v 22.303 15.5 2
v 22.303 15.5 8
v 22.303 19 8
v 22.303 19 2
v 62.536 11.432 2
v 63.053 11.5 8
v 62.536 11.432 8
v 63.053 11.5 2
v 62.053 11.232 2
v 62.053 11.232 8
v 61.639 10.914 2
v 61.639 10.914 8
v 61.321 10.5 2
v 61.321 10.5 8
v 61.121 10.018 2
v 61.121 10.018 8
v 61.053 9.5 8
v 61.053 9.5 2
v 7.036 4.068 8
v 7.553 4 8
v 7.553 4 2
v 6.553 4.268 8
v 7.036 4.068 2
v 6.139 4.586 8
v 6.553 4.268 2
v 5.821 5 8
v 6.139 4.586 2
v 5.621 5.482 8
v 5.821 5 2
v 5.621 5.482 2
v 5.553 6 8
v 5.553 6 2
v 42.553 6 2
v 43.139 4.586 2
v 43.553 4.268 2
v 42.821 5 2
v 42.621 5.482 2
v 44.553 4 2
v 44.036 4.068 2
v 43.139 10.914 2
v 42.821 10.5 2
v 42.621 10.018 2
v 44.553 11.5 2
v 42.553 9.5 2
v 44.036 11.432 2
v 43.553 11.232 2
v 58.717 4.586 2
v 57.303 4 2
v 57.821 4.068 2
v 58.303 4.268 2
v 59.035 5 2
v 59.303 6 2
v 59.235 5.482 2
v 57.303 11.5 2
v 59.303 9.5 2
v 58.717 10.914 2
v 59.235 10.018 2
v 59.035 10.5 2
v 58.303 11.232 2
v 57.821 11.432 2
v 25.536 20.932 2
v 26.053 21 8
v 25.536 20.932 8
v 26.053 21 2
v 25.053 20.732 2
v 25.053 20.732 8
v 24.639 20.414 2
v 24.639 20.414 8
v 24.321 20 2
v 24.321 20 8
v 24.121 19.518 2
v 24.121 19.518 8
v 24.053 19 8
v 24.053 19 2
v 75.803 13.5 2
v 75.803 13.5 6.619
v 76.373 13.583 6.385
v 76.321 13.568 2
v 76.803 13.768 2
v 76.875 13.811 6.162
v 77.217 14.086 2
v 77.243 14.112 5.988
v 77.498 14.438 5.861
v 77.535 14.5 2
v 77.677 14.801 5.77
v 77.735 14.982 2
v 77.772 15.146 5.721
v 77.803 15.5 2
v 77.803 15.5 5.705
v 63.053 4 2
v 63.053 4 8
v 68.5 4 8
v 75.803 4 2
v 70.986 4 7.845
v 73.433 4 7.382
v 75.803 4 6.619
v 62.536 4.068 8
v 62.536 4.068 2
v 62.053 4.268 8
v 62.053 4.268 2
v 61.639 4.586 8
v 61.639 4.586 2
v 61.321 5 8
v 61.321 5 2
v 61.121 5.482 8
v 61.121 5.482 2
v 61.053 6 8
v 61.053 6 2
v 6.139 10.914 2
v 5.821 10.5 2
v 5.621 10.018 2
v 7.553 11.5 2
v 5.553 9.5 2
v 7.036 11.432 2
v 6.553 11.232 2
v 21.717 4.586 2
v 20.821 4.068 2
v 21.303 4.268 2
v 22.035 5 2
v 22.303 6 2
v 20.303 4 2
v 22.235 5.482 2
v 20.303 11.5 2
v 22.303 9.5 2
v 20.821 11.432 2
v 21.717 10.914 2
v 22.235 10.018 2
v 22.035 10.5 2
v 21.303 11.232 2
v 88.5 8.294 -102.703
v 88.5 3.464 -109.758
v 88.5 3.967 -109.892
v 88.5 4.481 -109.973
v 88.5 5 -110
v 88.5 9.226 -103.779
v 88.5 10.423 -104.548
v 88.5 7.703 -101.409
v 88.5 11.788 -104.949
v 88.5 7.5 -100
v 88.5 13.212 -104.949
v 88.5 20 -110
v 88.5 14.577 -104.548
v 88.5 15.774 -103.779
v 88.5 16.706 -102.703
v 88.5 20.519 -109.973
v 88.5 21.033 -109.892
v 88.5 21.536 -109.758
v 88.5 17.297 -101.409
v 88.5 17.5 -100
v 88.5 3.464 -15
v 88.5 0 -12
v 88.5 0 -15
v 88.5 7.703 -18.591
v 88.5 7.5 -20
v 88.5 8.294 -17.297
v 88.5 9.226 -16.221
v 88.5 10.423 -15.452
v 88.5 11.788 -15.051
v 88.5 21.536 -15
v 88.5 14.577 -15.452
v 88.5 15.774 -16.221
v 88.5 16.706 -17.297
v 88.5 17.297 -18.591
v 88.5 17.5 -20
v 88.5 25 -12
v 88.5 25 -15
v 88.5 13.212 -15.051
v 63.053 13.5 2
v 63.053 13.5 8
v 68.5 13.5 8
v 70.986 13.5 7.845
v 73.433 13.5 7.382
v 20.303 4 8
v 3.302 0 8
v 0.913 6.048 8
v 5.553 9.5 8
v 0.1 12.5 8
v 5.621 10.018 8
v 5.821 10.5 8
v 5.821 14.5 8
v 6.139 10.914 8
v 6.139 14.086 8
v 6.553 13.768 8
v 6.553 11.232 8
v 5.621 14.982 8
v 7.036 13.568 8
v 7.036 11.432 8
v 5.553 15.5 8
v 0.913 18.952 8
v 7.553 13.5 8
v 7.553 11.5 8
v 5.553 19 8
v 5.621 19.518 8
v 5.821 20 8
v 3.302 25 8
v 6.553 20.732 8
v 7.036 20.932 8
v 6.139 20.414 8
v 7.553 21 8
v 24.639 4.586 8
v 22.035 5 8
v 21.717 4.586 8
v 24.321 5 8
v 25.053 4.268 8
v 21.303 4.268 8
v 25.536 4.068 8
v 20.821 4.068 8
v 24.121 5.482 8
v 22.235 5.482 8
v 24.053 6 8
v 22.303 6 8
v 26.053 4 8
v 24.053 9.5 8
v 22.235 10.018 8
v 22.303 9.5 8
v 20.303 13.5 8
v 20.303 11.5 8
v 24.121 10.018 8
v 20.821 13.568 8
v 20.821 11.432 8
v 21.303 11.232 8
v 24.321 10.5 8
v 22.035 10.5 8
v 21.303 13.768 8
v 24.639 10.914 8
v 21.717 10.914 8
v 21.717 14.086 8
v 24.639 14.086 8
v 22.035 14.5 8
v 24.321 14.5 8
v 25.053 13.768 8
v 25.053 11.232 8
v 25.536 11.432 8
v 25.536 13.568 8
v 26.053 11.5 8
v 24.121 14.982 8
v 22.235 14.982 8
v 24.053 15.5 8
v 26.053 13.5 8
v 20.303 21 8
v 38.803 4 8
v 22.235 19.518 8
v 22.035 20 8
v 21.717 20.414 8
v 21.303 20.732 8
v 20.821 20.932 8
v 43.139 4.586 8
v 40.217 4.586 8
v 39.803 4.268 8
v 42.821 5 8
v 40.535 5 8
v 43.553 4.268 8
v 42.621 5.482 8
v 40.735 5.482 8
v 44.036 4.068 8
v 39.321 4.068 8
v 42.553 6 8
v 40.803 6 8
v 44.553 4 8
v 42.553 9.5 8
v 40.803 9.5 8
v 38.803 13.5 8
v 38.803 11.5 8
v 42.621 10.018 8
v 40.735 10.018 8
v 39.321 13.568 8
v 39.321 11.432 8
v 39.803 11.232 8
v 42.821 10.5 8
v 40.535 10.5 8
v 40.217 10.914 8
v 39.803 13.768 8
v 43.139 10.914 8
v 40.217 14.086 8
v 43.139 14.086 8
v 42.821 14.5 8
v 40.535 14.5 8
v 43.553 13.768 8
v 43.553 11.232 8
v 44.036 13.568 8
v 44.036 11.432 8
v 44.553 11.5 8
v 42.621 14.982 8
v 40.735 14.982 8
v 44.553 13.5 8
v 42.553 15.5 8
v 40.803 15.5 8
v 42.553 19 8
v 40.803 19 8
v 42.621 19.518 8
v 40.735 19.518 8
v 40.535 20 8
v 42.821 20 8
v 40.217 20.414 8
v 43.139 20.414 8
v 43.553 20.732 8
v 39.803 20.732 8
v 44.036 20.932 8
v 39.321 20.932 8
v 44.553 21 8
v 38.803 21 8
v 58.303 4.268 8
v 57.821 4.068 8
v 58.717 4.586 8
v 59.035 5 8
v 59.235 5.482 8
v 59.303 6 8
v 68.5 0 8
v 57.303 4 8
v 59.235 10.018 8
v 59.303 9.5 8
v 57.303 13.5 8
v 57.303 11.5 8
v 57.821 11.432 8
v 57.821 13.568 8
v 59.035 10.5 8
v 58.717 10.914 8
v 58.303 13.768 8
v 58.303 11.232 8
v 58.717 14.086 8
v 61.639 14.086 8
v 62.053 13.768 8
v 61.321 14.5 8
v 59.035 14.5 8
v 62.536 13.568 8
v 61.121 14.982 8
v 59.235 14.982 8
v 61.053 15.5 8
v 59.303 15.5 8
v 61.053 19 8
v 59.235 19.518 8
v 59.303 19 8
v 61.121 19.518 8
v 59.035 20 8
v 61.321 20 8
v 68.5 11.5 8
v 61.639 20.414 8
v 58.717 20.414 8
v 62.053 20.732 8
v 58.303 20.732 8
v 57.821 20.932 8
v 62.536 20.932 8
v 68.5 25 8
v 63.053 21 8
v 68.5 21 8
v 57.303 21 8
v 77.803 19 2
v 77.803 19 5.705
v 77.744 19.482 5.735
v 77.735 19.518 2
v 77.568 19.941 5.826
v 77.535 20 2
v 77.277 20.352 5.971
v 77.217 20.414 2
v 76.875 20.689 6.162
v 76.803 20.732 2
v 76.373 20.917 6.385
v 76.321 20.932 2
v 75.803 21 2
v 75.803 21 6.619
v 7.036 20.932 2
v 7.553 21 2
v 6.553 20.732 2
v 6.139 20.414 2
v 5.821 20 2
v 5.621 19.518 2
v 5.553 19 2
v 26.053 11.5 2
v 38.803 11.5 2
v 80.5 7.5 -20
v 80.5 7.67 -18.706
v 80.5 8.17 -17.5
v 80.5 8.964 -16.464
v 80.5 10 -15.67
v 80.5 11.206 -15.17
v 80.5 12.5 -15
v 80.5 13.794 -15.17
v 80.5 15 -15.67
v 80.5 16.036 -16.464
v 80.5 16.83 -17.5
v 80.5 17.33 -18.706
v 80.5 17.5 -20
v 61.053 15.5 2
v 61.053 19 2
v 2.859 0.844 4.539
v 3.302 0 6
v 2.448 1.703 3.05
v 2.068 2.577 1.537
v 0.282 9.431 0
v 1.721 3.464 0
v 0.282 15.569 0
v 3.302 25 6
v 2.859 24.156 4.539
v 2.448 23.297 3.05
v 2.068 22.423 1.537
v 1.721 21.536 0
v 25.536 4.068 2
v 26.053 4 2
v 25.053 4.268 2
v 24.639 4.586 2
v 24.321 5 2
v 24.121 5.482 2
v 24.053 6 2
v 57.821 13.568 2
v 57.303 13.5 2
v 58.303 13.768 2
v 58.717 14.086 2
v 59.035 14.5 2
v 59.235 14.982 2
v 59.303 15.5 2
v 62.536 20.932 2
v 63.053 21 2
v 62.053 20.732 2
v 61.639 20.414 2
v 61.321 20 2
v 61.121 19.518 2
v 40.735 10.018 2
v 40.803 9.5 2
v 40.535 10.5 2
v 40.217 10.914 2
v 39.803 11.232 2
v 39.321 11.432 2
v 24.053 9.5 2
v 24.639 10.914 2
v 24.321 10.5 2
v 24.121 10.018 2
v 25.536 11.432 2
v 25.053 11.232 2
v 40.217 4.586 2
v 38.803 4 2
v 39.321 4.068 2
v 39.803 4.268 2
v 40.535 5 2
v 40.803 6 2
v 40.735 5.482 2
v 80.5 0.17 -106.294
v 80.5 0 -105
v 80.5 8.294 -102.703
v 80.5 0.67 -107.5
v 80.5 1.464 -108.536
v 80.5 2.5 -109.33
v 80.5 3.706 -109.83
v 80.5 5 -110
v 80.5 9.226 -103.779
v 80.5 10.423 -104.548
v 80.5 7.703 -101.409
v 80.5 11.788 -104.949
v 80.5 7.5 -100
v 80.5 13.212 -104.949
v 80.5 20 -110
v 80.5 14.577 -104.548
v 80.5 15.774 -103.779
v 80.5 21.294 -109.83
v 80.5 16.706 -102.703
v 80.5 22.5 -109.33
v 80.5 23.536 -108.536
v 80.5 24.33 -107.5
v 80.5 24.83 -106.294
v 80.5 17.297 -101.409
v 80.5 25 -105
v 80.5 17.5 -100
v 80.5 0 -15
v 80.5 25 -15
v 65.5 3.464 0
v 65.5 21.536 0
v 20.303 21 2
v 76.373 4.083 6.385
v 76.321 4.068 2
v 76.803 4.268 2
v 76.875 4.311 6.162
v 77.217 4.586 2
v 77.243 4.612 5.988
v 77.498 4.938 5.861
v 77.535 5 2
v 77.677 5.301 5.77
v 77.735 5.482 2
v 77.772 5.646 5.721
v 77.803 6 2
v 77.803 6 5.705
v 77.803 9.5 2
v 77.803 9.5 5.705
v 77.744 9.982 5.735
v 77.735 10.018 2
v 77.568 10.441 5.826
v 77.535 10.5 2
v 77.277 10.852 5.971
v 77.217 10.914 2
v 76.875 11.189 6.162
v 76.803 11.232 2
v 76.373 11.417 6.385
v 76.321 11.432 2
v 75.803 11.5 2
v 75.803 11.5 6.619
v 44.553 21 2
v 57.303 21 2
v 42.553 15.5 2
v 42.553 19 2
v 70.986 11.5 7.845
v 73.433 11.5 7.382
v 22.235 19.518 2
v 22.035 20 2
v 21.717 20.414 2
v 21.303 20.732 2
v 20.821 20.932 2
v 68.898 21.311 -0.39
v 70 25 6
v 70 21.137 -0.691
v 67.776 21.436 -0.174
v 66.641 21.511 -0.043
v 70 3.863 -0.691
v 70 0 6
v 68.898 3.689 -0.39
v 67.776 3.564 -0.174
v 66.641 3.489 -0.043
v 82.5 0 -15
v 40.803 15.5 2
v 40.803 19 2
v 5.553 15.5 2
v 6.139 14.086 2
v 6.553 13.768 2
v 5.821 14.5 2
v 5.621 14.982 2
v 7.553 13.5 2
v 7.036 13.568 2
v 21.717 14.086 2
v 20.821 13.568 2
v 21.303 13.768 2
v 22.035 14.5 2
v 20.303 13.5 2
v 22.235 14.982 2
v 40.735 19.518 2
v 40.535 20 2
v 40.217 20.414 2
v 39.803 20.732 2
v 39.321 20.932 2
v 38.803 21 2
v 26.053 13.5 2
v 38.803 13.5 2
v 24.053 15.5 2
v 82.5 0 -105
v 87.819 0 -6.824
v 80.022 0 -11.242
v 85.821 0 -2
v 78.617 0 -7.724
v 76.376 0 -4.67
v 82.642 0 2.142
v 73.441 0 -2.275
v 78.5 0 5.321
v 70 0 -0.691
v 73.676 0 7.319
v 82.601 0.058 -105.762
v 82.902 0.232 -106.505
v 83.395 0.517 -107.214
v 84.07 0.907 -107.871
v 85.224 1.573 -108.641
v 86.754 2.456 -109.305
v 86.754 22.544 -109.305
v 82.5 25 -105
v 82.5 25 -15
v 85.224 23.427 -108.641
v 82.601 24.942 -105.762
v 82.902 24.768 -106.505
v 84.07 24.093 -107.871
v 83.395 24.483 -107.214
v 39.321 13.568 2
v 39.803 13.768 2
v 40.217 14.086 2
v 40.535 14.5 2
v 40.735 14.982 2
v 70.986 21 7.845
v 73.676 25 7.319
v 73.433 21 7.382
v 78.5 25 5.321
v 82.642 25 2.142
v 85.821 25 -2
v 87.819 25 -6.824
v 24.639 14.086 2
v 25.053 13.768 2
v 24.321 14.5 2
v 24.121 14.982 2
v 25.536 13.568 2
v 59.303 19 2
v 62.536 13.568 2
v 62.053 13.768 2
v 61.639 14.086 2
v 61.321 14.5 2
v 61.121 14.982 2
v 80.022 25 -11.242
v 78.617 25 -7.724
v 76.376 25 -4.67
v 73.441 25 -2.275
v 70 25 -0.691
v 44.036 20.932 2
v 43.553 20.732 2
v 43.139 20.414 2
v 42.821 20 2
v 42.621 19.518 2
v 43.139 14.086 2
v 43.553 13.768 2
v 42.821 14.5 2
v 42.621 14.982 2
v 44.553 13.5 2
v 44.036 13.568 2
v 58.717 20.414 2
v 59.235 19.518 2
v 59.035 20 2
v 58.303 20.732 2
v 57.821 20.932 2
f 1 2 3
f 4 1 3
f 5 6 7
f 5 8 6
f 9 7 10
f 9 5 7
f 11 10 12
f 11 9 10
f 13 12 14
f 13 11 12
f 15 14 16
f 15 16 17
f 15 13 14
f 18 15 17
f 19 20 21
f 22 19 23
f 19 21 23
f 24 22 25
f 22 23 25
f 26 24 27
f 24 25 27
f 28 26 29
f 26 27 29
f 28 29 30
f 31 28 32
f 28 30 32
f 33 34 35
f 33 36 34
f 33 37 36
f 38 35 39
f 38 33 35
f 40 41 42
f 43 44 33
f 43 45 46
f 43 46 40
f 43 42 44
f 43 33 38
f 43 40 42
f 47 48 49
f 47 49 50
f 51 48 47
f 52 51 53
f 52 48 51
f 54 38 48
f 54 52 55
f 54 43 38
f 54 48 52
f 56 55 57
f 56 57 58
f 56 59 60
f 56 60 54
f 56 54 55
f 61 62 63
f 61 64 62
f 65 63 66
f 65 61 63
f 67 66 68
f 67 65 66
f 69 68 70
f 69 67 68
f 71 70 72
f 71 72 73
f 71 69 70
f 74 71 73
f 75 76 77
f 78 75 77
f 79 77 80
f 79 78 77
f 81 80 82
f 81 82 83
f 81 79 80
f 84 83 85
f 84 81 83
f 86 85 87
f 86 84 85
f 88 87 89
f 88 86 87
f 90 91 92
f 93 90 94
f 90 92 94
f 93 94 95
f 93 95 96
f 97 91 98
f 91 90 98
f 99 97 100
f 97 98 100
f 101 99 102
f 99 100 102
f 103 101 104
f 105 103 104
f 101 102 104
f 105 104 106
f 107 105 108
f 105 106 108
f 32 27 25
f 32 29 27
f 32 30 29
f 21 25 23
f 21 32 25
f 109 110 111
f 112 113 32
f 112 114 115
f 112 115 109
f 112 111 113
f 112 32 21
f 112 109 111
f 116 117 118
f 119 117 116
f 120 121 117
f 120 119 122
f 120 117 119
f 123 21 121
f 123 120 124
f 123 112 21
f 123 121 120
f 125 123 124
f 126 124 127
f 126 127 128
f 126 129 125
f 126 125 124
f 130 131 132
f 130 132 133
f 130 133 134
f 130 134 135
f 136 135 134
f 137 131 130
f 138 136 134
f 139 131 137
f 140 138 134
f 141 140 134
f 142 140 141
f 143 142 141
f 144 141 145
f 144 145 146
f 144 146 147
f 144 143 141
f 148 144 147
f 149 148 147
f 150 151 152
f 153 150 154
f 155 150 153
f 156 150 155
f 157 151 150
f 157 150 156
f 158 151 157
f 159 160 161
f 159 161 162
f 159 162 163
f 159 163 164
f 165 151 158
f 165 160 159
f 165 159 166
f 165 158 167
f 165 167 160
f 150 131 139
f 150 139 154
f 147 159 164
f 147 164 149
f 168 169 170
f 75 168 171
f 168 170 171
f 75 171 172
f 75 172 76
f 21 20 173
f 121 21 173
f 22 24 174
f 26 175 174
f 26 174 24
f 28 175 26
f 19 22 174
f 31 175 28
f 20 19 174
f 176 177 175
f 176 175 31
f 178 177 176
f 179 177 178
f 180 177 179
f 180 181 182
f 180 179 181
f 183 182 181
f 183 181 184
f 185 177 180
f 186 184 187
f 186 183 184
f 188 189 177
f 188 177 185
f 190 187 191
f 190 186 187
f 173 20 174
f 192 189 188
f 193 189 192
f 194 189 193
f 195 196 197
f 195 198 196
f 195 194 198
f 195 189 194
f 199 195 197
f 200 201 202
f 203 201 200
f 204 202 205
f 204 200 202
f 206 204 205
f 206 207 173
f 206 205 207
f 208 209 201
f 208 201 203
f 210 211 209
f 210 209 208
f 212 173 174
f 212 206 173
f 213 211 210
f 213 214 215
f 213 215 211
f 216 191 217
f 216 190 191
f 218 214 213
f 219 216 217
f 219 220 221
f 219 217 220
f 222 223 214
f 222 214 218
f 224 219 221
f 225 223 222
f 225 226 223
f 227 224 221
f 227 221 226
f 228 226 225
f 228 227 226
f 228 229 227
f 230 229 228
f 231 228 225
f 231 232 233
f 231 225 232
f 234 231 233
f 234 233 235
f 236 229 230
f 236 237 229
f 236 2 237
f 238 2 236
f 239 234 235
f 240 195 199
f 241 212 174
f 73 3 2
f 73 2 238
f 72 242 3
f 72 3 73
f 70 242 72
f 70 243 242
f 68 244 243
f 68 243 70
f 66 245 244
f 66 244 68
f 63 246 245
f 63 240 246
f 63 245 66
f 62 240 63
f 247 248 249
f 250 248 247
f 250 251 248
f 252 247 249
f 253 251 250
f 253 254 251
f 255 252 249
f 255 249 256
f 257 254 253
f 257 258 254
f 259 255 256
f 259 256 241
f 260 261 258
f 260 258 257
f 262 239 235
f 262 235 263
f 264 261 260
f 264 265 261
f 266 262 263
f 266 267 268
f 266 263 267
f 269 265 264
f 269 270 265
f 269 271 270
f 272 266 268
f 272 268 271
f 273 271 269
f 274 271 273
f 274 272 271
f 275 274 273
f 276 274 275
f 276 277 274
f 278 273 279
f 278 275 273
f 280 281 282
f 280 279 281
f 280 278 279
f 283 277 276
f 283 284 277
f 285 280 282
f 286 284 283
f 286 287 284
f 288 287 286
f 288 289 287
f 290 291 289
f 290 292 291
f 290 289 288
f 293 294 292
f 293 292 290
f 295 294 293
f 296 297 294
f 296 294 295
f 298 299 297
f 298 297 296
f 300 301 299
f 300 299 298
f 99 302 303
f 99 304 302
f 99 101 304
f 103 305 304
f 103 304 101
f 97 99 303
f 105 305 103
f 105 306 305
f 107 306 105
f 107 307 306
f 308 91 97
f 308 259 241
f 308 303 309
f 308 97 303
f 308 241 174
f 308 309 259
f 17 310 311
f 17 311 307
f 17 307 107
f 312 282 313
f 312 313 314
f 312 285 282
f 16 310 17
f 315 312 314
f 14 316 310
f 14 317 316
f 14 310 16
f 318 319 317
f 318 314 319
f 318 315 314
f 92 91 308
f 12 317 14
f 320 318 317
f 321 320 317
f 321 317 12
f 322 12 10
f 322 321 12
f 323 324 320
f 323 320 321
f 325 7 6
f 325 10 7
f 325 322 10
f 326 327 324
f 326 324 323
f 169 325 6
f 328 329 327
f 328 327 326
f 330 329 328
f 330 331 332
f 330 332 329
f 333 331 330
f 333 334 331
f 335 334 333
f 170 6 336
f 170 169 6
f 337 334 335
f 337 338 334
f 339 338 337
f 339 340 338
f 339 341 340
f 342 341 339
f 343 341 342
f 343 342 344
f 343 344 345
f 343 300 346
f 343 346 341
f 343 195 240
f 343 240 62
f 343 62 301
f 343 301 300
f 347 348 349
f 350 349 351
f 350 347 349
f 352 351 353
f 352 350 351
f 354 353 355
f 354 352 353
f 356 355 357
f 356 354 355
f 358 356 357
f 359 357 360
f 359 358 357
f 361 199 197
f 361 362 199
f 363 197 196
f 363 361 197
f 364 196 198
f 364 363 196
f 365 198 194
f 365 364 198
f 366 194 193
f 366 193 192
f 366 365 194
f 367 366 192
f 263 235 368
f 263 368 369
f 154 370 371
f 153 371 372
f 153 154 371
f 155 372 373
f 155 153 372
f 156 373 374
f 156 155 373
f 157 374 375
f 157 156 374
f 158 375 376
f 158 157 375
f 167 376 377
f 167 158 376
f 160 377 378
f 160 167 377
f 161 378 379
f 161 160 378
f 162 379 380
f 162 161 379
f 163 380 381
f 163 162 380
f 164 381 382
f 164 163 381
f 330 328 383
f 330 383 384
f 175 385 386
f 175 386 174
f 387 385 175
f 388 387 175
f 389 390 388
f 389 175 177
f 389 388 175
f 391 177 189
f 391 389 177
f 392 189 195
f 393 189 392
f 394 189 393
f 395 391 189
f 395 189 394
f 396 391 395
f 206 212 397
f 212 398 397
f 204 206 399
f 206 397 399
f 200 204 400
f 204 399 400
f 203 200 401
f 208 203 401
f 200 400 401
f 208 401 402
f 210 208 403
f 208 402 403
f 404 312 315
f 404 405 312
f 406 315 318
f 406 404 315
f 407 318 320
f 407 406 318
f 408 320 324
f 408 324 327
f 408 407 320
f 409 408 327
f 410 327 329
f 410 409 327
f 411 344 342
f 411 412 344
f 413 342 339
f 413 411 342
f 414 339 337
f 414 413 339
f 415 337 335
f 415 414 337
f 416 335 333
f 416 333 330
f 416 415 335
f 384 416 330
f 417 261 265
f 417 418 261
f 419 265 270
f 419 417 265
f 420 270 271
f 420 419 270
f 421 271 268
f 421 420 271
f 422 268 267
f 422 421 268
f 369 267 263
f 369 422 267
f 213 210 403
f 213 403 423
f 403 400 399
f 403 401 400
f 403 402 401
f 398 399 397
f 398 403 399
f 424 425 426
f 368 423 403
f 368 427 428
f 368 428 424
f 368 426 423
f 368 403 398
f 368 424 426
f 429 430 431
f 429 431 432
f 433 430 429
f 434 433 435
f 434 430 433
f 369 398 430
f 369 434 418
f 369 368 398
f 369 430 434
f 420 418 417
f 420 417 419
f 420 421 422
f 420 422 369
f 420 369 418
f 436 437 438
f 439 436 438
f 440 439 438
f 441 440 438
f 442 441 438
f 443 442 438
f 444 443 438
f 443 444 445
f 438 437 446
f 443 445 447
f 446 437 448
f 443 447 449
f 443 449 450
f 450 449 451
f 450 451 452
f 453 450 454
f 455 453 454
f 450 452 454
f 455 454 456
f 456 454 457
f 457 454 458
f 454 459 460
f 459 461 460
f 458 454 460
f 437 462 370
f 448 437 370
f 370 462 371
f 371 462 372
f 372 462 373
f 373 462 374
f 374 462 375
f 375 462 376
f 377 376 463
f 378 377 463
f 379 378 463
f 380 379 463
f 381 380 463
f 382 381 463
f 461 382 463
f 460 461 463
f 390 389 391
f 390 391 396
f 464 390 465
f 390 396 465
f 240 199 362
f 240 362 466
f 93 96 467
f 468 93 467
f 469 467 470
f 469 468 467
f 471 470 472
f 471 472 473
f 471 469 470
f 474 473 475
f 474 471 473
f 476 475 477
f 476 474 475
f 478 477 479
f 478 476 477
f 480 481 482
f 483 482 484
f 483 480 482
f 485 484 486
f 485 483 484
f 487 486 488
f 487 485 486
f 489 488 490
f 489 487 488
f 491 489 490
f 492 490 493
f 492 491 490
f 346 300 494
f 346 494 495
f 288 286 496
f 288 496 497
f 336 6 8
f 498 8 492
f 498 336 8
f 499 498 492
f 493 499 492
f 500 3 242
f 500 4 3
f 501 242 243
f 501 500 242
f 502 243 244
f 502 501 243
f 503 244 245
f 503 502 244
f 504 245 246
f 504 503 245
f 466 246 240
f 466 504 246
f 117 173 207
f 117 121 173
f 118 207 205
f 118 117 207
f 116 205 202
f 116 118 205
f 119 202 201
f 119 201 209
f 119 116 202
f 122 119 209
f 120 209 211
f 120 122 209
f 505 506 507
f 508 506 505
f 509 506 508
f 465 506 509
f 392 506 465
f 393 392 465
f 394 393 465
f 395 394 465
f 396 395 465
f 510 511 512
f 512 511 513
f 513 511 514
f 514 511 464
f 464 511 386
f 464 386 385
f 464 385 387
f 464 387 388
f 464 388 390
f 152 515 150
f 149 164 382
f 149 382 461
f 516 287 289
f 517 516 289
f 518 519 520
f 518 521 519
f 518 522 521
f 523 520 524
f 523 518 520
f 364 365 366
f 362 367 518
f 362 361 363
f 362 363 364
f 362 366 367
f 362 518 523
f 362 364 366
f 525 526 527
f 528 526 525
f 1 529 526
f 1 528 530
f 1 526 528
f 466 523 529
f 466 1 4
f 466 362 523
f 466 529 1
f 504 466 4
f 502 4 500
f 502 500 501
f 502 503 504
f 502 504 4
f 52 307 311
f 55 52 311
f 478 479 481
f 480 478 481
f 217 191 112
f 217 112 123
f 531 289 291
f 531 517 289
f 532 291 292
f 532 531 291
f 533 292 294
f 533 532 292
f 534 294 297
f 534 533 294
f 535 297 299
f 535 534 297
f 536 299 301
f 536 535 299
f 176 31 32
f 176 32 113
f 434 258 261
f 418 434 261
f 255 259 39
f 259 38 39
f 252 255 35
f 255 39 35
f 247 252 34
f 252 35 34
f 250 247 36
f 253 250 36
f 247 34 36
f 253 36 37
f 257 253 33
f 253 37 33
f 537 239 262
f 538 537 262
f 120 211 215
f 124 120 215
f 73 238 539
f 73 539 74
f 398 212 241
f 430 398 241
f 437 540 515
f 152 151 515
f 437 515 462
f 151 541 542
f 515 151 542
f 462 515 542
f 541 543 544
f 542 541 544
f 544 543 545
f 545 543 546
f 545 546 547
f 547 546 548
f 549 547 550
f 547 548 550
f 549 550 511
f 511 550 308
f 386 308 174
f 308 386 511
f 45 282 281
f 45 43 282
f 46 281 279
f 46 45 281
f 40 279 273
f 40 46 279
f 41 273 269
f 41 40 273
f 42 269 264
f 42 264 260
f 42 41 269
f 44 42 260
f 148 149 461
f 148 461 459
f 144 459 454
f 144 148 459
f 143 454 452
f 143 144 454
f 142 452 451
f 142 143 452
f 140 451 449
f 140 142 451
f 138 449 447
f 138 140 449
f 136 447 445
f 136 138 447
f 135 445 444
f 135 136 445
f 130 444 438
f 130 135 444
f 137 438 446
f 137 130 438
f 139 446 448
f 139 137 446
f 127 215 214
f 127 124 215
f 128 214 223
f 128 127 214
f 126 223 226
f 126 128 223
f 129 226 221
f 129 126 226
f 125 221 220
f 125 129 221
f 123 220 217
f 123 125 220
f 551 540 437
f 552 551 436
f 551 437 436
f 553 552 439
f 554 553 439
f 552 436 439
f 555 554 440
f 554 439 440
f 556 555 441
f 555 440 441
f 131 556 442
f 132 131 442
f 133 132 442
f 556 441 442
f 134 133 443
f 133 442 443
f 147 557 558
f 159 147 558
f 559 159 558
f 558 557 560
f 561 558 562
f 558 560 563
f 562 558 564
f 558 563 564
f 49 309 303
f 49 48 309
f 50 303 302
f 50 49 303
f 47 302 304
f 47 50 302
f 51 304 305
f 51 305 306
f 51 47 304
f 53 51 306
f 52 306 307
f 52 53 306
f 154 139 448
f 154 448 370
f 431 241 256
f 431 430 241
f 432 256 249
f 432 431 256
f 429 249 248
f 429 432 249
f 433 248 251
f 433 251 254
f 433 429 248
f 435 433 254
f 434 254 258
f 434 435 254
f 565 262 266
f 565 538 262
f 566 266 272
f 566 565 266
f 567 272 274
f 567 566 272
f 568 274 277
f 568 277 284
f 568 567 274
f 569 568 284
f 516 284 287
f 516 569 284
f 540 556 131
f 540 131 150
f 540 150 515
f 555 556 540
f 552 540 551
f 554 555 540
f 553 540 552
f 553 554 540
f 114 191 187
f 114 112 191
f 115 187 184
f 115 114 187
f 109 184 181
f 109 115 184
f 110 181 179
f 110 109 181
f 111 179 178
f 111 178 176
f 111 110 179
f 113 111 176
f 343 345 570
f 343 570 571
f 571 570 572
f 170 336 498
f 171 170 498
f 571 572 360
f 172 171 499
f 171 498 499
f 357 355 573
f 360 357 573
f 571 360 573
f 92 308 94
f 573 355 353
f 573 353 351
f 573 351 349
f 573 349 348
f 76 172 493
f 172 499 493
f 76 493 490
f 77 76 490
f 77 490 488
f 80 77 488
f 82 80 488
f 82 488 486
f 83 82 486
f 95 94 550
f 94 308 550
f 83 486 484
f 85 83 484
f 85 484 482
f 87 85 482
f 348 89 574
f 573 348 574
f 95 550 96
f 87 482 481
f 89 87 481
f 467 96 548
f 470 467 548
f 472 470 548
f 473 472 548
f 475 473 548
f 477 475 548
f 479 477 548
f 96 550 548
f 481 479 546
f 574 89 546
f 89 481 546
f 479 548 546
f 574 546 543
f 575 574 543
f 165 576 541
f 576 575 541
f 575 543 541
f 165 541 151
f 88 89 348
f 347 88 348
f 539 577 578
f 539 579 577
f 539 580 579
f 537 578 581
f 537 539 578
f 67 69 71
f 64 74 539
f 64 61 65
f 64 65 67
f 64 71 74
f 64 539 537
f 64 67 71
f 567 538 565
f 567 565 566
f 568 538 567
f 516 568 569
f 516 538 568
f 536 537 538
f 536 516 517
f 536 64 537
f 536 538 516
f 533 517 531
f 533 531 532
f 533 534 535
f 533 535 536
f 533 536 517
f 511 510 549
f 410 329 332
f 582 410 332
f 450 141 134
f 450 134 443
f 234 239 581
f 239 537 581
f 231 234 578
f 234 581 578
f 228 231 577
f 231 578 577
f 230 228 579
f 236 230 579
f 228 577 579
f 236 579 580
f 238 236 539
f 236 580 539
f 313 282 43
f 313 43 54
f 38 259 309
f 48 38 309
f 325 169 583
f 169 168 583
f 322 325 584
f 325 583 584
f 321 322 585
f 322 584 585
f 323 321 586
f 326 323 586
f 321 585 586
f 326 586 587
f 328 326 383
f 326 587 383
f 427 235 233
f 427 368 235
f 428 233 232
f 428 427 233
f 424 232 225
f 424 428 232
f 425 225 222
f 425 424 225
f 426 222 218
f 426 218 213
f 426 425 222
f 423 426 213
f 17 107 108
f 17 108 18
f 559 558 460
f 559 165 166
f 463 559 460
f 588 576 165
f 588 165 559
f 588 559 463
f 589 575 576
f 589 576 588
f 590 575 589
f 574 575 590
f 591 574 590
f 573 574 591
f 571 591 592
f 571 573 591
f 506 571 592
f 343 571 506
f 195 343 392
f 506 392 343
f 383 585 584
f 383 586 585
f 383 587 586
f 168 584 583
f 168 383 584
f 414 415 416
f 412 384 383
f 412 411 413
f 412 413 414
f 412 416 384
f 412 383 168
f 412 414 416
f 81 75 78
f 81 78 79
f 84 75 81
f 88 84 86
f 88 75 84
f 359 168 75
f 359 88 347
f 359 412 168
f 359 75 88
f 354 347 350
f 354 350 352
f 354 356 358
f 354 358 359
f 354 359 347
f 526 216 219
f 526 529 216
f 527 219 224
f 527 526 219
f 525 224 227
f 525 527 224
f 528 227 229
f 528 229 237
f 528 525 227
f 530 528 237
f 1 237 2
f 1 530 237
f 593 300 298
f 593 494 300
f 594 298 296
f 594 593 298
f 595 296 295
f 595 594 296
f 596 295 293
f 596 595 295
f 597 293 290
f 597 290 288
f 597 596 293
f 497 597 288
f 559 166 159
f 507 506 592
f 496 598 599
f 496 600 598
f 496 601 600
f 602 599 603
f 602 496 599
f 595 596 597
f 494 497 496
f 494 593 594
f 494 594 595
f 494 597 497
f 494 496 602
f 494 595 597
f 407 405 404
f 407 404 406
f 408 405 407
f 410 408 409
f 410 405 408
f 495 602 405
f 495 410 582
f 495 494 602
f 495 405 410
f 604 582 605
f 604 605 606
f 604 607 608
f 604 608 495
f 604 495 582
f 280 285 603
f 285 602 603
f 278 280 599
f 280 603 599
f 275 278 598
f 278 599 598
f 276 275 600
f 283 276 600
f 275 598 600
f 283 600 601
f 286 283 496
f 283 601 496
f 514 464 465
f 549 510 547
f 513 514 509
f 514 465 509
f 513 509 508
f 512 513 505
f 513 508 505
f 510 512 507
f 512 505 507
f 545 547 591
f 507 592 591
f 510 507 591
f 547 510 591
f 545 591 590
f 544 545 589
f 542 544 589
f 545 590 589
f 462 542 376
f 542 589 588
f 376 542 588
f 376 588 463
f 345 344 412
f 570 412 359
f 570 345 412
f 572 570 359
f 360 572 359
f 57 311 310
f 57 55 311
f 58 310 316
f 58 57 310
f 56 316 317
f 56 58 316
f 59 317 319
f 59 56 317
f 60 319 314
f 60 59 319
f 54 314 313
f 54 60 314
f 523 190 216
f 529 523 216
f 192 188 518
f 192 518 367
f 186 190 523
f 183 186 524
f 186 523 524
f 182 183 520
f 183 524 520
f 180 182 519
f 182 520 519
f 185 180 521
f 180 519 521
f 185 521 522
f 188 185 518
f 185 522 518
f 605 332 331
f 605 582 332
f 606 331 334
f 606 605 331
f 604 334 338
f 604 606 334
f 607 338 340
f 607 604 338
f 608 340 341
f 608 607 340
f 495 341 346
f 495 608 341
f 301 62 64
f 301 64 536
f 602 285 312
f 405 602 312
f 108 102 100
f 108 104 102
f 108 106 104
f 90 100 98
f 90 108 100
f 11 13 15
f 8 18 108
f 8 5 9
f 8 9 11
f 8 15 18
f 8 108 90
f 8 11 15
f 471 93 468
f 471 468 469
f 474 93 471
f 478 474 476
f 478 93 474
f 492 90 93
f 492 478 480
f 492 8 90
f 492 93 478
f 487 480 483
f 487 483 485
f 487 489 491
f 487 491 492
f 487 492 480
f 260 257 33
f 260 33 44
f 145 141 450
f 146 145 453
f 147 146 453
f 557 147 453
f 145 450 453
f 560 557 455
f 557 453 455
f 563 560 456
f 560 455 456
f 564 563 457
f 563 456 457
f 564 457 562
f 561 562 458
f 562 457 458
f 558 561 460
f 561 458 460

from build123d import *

# Parameters (mm, degrees)
SKETCH_1_W                     = 88.5
SKETCH_1_H                     = 25
EXTRUDE_1_DEPTH                = 8
CUT_EXTRUDE_2_DEPTH            = 70
SKETCH_9_W                     = 16.75
SKETCH_9_H                     = 7.5
CUT_EXTRUDE_3_DEPTH            = 6
FILLET_4_R                     = 2
PATTERN_LINEAR_1_COUNT         = 4
PATTERN_LINEAR_1_PITCH         = 18.5
PATTERN_LINEAR_1_COUNT_DIR2    = 2
PATTERN_LINEAR_1_PITCH_DIR2    = 9.5
FILLET_4_OF_PATTERN_LINEAR_1_R = 2
SKETCH_10_W                    = 8
SKETCH_10_H                    = 25
EXTRUDE_2_DEPTH                = 110
FILLET_5_R                     = 20
FILLET_6_R                     = 15
FILLET_7_R                     = 5
CUT_EXTRUDE_4_DEPTH            = 95
CUT_EXTRUDE_5_REACH            = 145.378
CUT_EXTRUDE_7_REACH            = 145.378


with BuildPart() as part:
    # Эскиз1 → Бобышка-Вытянуть1 (new body)
    with BuildSketch(Plane.XY):
        with Locations((44.25, 12.5)):
            Rectangle(SKETCH_1_W, SKETCH_1_H)
    extrude(amount=EXTRUDE_1_DEPTH)

    # Эскиз4 → Вырез-Вытянуть2 (cut)
    with BuildSketch(Plane.ZY):
        Polygon((6, 0), (0, 3.464101615), (0, 0), align=None)
        Polygon((0, 25), (6, 25), (0, 21.535898385), align=None)
    extrude(amount=-CUT_EXTRUDE_2_DEPTH, mode=Mode.SUBTRACT)

    # Эскиз9 → Вырез-Вытянуть3 (cut)
    with BuildSketch(Plane.XY.offset(8)):
        with Locations((13.928226592, 17.25)):
            Rectangle(SKETCH_9_W, SKETCH_9_H)
    cut_extrude_3 = extrude(amount=-CUT_EXTRUDE_3_DEPTH, mode=Mode.SUBTRACT)

    # Скругление4
    fillet_4_edges = [part.edges().sort_by_distance(p)[0] for p in [
        (22.303226592, 13.5, 5),
        (22.303226592, 21, 5),
        (5.553226592, 21, 5),
        (5.553226592, 13.5, 5),
    ]]
    fillet(fillet_4_edges, radius=FILLET_4_R)

    # Линейный массив1: Cut-Extrude 3 4 × 2
    with Locations(*[(i * PATTERN_LINEAR_1_PITCH, -j * PATTERN_LINEAR_1_PITCH_DIR2, 0) for i in range(PATTERN_LINEAR_1_COUNT) for j in range(PATTERN_LINEAR_1_COUNT_DIR2) if (i, j) != (0, 0)]):
        add(cut_extrude_3, mode=Mode.SUBTRACT)

    # Скругление4 of Линейный массив1
    fillet_4_of_pattern_linear_1_edges = [part.edges().sort_by_distance(p)[0] for p in [
        (22.303226592, 4, 5),
        (22.303226592, 11.5, 5),
        (5.553226592, 11.5, 5),
        (5.553226592, 4, 5),
        (40.803226592, 13.5, 5),
        (40.803226592, 21, 5),
        (24.053226592, 21, 5),
        (24.053226592, 13.5, 5),
        (40.803226592, 4, 5),
        (40.803226592, 11.5, 5),
        (24.053226592, 11.5, 5),
        (24.053226592, 4, 5),
        (59.303226592, 13.5, 5),
        (59.303226592, 21, 5),
        (42.553226592, 21, 5),
        (42.553226592, 13.5, 5),
        (59.303226592, 4, 5),
        (59.303226592, 11.5, 5),
        (42.553226592, 11.5, 5),
        (42.553226592, 4, 5),
        (77.803226592, 13.5, 5),
        (77.803226592, 21, 5),
        (61.053226592, 21, 5),
        (61.053226592, 13.5, 5),
        (77.803226592, 4, 5),
        (77.803226592, 11.5, 5),
        (61.053226592, 11.5, 5),
        (61.053226592, 4, 5),
    ]]
    fillet(fillet_4_of_pattern_linear_1_edges, radius=FILLET_4_OF_PATTERN_LINEAR_1_R)

    # Эскиз10 → Бобышка-Вытянуть2 (add)
    with BuildSketch(Plane(origin=(0, 0, 0), x_dir=(-1, 0, 0), z_dir=(0, 0, -1))):
        with Locations((-84.5, 12.5)):
            Rectangle(SKETCH_10_W, SKETCH_10_H)
    extrude(amount=EXTRUDE_2_DEPTH)

    # Скругление5
    # the kernel refuses this fillet: 20 mm, written as the material it takes off along each edge
    with BuildSketch(Plane(origin=(88.5, -50, 8), x_dir=(-1, 0, 0), z_dir=(0, 1, 0))) as fillet_5_piece_1:
        with BuildLine():
            CenterArc((FILLET_5_R, -FILLET_5_R), FILLET_5_R, 90, 90)
            Line((0, -FILLET_5_R), (0, 0))
            Line((0, 0), (FILLET_5_R, 0))
        make_face()
    extrude(amount=125, mode=Mode.SUBTRACT)

    # Скругление6
    fillet_6_edges = [part.edges().sort_by_distance(p)[0] for p in [
        (80.5, 12.5, 0),
    ]]
    fillet(fillet_6_edges, radius=FILLET_6_R)

    # Скругление7
    fillet_7_edges = [part.edges().sort_by_distance(p)[0] for p in [
        (84.5, 0, -110),
        (84.5, 25, -110),
    ]]
    fillet(fillet_7_edges, radius=FILLET_7_R)

    # Эскиз11 → Вырез-Вытянуть4 (cut)
    with BuildSketch(Plane(origin=(0, 0, -110), x_dir=(-1, 0, 0), z_dir=(0, 0, -1))):
        Polygon((-82.5, 25), (-88.5, 25), (-88.5, 21.535898385), align=None)
        Polygon((-88.5, 3.464101615), (-82.5, 0), (-88.5, 0), align=None)
    extrude(amount=-CUT_EXTRUDE_4_DEPTH, mode=Mode.SUBTRACT)

    # Эскиз12 → Вырез-Вытянуть5 (cut, up to next)
    with BuildSketch(Plane(origin=(88.5, 0, 0), x_dir=(0, 0, -1), z_dir=(1, 0, 0)), mode=Mode.PRIVATE) as cut_extrude_5_sk1:
        with BuildLine():
            Line((20, 17.5), (100, 17.5))
            ThreePointArc((100, 17.5), (105, 12.5), (100, 7.5))
            Line((100, 7.5), (20, 7.5))
            ThreePointArc((20, 7.5), (15, 12.5), (20, 17.5))
        make_face()
    cut_extrude_5_tool1 = extrude(cut_extrude_5_sk1.sketch, amount=-CUT_EXTRUDE_5_REACH, mode=Mode.PRIVATE) & part.part
    add(cut_extrude_5_tool1.solids().sort_by_distance((88.5, 12.5, -60))[0], mode=Mode.SUBTRACT)

    # Эскиз13 → Вырез-Вытянуть7 (cut, up to next)
    with BuildSketch(Plane(origin=(0, 0, 0), x_dir=(-1, 0, 0), z_dir=(0, 0, -1)), mode=Mode.PRIVATE) as cut_extrude_7_sk1:
        with BuildLine():
            Line((-3.30197377, 25), (0, 25))
            Line((0, 25), (0, 0))
            Line((0, 0), (-3.30197377, 0))
            ThreePointArc((-3.30197377, 0), (-0.1, 12.5), (-3.30197377, 25))
        make_face()
    cut_extrude_7_tool1 = extrude(cut_extrude_7_sk1.sketch, amount=-CUT_EXTRUDE_7_REACH, mode=Mode.PRIVATE) & part.part
    add(cut_extrude_7_tool1.solids().sort_by_distance((1.650987, 24.747829, 0))[0], mode=Mode.SUBTRACT)


solid = part.part
